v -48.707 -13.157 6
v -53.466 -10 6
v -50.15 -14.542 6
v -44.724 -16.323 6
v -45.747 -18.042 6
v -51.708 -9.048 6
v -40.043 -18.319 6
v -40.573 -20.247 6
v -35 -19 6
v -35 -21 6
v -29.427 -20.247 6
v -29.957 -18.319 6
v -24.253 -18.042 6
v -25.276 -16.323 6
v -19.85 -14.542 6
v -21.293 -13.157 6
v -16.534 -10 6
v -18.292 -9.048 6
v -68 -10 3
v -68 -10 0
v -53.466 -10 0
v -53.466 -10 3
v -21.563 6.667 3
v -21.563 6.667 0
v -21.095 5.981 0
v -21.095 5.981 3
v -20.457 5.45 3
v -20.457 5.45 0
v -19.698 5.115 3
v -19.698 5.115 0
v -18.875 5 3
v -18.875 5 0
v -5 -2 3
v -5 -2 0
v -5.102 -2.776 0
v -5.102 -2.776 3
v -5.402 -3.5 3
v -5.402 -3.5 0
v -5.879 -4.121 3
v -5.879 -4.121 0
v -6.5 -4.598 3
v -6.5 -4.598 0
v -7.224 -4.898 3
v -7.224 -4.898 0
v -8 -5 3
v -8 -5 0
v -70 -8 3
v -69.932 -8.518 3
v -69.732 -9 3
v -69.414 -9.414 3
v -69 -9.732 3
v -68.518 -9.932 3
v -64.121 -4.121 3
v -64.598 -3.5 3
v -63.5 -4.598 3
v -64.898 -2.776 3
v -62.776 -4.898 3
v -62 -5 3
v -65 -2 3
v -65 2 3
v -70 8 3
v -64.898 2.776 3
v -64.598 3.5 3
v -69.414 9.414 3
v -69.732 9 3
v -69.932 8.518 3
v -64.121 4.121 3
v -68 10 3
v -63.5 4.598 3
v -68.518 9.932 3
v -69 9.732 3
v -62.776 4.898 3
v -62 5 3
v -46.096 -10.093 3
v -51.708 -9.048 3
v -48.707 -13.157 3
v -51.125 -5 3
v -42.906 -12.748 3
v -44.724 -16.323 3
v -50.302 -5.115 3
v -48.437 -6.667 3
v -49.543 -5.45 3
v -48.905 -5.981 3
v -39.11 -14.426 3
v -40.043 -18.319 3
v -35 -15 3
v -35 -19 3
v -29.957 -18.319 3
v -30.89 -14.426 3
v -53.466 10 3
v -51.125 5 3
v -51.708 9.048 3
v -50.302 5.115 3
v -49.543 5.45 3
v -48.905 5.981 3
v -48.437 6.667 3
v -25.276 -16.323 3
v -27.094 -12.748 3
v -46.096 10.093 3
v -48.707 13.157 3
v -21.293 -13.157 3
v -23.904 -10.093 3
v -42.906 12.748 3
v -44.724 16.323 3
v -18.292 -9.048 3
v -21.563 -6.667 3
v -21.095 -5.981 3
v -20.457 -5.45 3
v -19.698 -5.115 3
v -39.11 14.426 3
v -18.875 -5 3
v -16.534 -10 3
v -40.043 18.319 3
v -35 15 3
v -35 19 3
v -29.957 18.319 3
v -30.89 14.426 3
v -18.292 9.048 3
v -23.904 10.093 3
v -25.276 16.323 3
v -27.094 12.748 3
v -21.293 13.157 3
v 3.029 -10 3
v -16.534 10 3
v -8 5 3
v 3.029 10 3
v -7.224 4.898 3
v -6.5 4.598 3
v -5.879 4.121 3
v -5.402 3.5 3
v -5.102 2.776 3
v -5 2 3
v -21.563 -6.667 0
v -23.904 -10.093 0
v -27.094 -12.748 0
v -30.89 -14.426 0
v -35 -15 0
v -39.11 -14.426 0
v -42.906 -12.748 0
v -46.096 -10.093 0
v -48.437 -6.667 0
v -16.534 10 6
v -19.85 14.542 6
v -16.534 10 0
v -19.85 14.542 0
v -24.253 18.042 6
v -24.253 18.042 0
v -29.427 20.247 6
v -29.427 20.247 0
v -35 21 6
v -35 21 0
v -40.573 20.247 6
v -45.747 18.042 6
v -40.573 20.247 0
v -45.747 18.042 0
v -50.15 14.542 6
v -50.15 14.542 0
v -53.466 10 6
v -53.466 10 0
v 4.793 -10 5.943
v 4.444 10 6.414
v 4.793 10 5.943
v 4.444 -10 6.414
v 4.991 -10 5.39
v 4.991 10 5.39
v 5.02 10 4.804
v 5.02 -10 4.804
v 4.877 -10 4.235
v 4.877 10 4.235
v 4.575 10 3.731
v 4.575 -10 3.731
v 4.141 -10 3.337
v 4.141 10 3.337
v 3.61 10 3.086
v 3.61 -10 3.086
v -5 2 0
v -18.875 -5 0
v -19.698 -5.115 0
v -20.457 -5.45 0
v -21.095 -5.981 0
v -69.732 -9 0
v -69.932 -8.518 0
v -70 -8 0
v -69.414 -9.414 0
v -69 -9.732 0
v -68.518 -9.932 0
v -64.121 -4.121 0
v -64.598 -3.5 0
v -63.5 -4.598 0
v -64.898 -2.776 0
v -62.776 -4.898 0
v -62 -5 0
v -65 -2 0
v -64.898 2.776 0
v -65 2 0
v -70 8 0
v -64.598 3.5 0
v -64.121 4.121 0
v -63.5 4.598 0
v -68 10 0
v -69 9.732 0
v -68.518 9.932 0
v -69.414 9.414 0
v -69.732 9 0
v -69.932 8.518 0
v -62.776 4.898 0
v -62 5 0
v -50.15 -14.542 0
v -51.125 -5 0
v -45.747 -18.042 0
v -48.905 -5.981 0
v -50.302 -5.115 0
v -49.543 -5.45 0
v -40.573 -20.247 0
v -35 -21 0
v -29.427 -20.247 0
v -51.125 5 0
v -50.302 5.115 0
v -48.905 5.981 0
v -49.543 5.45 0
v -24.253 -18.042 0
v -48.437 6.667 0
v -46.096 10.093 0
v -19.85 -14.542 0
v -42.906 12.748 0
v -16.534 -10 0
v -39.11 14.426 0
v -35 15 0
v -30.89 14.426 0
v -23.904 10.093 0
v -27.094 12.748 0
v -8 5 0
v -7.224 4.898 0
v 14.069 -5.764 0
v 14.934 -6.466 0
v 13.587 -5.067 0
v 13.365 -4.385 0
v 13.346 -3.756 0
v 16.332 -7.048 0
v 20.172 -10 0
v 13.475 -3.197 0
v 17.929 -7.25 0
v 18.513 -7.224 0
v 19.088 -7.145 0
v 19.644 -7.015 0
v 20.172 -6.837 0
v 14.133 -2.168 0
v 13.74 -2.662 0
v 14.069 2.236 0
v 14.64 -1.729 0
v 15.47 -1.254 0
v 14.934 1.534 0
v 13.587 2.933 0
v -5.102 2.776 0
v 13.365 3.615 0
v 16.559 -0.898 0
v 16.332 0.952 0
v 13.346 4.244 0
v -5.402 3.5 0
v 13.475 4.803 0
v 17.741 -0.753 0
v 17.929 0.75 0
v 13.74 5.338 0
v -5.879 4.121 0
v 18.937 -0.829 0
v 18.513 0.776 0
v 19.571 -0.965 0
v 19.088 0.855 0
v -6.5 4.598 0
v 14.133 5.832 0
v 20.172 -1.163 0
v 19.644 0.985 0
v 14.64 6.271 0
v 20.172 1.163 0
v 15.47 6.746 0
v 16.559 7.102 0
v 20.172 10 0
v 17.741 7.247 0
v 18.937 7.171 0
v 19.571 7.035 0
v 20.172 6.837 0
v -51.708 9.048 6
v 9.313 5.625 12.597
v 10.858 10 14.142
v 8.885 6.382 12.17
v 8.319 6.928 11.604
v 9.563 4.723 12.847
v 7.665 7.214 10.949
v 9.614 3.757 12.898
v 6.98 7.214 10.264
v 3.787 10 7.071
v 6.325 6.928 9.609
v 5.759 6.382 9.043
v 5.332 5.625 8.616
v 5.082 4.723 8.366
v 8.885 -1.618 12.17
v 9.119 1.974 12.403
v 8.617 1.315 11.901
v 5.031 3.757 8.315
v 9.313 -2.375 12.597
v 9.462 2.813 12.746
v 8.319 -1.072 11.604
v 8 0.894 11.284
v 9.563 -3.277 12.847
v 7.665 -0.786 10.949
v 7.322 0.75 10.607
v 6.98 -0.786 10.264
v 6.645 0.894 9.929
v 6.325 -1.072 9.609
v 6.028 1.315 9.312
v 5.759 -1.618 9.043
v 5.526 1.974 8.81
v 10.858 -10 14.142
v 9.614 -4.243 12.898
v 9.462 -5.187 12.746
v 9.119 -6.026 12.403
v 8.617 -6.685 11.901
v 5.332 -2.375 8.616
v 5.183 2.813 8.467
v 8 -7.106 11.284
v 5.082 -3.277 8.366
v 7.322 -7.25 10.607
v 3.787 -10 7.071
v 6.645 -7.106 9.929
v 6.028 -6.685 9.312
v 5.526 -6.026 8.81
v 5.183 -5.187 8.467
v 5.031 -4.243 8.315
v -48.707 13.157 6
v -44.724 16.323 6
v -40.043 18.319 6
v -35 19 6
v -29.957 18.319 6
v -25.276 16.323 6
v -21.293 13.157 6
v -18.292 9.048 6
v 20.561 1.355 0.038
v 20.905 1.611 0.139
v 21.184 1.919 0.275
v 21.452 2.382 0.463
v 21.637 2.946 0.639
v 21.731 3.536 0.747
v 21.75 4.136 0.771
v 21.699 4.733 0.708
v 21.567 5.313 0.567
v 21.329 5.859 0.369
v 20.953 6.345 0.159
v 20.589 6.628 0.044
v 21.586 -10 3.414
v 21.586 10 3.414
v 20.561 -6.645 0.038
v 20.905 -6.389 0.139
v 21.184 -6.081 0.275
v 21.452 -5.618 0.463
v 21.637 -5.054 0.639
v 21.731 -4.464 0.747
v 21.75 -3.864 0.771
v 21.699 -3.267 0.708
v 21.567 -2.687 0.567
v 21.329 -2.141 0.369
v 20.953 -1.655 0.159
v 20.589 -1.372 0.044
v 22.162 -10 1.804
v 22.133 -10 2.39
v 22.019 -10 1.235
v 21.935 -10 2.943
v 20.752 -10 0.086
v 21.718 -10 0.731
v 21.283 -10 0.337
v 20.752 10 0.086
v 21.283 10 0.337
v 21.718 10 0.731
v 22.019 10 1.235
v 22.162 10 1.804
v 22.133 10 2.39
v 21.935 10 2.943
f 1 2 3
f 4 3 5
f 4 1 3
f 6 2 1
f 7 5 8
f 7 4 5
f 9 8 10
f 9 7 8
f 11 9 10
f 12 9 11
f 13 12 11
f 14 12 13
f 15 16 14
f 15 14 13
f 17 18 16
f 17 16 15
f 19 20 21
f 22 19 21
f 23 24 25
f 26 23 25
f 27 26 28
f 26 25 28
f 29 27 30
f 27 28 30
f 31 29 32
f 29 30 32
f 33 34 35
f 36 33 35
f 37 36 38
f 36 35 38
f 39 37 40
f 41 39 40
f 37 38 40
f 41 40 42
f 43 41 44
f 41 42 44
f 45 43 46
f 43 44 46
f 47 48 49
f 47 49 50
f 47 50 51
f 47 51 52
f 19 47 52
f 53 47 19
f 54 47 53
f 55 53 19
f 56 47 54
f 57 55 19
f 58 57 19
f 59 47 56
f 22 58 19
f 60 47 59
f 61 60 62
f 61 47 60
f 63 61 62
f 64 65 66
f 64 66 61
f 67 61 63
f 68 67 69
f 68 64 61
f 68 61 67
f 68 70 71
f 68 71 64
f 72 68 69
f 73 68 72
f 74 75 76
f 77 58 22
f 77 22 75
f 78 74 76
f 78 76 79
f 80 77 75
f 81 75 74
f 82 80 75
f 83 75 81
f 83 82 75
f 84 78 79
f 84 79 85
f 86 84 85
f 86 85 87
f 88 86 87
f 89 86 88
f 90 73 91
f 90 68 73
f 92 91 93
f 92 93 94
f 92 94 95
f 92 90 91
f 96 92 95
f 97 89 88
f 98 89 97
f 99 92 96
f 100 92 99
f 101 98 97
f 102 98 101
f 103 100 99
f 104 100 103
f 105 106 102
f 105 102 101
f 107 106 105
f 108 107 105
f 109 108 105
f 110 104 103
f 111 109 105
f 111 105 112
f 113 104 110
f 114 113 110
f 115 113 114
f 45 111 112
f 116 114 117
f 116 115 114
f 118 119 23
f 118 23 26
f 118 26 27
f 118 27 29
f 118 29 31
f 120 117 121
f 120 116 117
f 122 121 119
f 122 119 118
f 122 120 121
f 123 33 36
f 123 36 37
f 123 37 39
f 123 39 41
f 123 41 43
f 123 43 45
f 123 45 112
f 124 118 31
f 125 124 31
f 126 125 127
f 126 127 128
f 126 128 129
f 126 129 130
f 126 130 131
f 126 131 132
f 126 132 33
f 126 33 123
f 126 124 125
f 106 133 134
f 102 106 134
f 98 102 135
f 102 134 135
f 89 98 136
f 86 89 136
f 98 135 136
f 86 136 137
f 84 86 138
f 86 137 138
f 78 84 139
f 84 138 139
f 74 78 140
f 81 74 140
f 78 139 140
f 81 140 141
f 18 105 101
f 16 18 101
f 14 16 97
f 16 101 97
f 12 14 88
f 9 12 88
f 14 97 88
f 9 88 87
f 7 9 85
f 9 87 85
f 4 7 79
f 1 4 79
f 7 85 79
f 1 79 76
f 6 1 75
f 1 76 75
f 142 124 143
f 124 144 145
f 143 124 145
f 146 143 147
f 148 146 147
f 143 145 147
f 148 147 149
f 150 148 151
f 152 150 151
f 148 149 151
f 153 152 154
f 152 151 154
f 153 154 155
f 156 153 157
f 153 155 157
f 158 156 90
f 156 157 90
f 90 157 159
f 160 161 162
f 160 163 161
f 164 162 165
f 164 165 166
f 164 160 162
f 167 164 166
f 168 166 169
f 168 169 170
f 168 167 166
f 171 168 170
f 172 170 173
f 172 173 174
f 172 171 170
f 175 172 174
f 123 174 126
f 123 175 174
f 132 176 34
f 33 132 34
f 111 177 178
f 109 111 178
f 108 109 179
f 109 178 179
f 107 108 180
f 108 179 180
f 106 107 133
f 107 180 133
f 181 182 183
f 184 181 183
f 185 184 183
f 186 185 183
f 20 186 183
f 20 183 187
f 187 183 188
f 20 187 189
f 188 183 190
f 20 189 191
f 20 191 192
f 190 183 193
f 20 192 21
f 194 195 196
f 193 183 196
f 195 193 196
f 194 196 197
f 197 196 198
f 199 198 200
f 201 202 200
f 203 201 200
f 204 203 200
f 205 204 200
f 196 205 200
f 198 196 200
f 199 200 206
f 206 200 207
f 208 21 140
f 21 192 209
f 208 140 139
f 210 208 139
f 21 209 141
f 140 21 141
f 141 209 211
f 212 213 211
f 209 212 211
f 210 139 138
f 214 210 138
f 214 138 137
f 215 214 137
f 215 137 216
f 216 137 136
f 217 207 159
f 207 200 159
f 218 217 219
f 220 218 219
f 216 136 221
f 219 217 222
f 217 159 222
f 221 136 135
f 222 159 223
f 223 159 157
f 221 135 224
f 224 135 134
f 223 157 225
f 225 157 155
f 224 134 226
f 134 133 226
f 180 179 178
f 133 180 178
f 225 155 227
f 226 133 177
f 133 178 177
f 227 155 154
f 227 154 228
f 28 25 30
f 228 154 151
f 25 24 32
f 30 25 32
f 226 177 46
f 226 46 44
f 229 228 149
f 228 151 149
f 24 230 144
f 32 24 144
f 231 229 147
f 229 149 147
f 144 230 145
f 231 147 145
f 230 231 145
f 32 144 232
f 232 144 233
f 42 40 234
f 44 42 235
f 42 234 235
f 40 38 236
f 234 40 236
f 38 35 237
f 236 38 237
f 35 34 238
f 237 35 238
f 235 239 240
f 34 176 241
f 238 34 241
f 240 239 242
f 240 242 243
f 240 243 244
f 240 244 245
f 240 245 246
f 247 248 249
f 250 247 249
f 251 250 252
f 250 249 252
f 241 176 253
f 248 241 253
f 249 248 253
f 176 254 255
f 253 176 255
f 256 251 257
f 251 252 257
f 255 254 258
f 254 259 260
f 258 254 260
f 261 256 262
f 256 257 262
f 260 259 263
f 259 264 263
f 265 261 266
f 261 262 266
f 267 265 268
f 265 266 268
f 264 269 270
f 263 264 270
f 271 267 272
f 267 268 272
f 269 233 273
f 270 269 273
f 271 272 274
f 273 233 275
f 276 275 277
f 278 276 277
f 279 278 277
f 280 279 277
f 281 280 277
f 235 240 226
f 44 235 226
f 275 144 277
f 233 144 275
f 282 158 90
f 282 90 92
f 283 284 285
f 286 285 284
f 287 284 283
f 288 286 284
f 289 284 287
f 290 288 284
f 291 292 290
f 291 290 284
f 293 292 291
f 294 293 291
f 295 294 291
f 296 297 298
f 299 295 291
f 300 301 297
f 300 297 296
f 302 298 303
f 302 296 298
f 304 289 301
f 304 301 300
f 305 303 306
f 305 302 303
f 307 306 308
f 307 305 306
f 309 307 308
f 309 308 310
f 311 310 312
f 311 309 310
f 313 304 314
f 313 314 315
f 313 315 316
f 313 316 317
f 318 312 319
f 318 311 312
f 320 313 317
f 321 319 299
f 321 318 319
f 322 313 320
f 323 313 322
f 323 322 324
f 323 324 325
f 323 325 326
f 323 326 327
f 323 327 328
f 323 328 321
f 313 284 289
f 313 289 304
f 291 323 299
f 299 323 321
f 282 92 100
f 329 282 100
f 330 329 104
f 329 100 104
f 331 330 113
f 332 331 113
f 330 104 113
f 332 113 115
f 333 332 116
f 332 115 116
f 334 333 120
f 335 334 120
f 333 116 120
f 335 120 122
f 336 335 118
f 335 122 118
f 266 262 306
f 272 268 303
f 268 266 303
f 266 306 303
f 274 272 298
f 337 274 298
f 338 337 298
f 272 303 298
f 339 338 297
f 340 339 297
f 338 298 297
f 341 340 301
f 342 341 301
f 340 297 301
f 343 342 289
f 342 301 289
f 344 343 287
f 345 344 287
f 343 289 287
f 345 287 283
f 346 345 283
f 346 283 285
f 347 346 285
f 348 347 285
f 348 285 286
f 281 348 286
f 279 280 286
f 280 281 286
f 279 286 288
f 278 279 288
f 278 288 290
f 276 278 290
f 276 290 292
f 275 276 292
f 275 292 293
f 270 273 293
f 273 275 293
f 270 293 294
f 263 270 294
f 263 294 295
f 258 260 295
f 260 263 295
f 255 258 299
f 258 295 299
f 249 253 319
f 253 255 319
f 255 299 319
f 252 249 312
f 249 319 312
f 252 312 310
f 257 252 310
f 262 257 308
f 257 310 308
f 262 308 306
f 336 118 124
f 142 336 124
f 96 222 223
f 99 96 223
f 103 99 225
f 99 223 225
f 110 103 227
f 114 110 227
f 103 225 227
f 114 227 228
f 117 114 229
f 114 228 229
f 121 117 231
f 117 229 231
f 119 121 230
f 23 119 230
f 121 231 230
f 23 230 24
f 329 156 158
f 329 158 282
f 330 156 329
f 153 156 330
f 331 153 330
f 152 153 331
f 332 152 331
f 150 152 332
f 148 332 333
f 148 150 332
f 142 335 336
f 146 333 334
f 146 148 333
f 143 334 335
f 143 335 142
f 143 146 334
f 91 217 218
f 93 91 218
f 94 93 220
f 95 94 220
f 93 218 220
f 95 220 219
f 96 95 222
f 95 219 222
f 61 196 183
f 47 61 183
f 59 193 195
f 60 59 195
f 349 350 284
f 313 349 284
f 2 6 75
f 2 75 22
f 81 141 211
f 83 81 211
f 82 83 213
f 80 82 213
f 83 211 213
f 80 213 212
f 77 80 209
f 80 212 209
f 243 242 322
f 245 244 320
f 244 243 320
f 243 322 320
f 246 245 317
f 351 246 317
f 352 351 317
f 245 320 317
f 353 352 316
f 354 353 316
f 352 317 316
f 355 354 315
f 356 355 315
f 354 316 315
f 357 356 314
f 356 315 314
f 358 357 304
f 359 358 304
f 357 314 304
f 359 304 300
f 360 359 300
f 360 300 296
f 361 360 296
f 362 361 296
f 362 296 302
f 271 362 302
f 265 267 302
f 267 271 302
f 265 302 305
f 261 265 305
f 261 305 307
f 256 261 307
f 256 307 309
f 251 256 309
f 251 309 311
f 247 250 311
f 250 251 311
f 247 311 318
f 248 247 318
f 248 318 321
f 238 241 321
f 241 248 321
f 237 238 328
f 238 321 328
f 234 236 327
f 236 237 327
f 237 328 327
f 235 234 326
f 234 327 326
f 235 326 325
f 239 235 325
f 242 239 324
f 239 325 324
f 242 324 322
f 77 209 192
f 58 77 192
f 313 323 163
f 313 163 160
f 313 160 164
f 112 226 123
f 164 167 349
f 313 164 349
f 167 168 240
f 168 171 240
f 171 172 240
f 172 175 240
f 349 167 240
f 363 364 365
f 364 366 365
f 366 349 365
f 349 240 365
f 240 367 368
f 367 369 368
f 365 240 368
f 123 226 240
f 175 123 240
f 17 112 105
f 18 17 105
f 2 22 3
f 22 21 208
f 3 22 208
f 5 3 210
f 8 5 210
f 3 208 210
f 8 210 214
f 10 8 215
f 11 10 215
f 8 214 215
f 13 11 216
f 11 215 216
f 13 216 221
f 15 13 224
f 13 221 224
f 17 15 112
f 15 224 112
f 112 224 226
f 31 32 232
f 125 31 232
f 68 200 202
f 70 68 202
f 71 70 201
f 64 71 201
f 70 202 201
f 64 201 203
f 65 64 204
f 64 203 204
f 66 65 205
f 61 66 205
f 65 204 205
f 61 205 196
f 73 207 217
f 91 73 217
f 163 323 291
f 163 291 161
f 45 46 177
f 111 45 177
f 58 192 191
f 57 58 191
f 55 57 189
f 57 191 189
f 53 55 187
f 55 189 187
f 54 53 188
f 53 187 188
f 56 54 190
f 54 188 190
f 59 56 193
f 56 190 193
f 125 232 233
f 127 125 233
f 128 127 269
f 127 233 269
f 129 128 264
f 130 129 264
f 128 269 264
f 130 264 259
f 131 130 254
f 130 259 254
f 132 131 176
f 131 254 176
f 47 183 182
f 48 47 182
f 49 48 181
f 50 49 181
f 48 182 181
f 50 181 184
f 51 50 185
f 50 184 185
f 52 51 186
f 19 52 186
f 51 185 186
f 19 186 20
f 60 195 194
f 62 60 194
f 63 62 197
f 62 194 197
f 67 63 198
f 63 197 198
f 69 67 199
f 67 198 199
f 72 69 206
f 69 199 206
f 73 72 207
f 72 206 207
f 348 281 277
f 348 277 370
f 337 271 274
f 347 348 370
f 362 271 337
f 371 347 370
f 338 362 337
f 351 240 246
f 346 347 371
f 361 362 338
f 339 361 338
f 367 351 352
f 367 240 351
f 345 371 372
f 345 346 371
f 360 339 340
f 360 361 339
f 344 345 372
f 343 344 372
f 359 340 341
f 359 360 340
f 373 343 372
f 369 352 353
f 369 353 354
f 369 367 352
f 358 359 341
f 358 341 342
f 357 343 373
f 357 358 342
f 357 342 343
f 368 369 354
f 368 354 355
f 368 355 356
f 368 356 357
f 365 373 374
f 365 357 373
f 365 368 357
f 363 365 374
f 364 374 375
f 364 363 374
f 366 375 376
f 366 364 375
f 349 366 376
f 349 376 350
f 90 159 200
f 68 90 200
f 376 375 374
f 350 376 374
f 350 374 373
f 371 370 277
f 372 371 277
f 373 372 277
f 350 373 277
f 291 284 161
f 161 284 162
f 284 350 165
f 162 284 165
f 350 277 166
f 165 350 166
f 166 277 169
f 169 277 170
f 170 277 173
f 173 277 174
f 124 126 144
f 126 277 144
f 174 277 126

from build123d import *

# Parameters (mm, degrees)
F1_DEPTH = 10
F2_R     = 3.25
F3_DEPTH = 25
F5_DEPTH = 3
F7_DEPTH = 3


with BuildPart() as f1:
    # F0 (on Front) → F1 (new body, symmetric)
    with BuildSketch(Plane.XZ):
        with BuildLine():
            Line((0, 3), (0, 0))
            Line((0, 0), (20.171573, 0))
            ThreePointArc((20.171573, 0), (22.019332, 1.234633), (21.585786, 3.414214))
            Line((21.585786, 3.414214), (10.857864, 14.142136))
            Line((10.857864, 14.142136), (3.786797, 7.071068))
            Line((3.786797, 7.071068), (4.443651, 6.414214))
            ThreePointArc((4.443651, 6.414214), (4.877196, 4.234633), (3.029437, 3))
            Line((3.029437, 3), (0, 3))
        make_face()
    extrude(amount=F1_DEPTH, both=True)

    # F2 (on face) → F3 (cut)
    with BuildSketch(Plane(origin=(-1.642136, 0, 1.642136), x_dir=(0, -1, 0), z_dir=(-0.707107, 0, 0.707107))):
        with Locations((-4, 12.67767)):
            Circle(F2_R)
        with Locations((4, 12.67767)):
            Circle(F2_R)
    extrude(amount=-F3_DEPTH, mode=Mode.SUBTRACT)

    # F4 (on Top) → F5 (join)
    with BuildSketch(Plane.XY):
        with BuildLine():
            Line((0, -10), (0, 10))
            Line((0, 10), (-16.533815, 10))
            ThreePointArc((-16.533815, 10), (-35, 21), (-53.466185, 10))
            Line((-53.466185, 10), (-68, 10))
            ThreePointArc((-68, 10), (-69.414214, 9.414214), (-70, 8))
            Line((-70, 8), (-70, -8))
            ThreePointArc((-70, -8), (-69.414214, -9.414214), (-68, -10))
            Line((-68, -10), (-53.466185, -10))
            ThreePointArc((-53.466185, -10), (-35, -21), (-16.533815, -10))
            Line((-16.533815, -10), (0, -10))
        make_face()
        with BuildLine():
            ThreePointArc((-21.562904, -6.666667), (-35, -15), (-48.437096, -6.666667))
            ThreePointArc((-48.437096, -6.666667), (-49.543377, -5.45049), (-51.124515, -5))
            Line((-51.124515, -5), (-62, -5))
            ThreePointArc((-62, -5), (-64.12132, -4.12132), (-65, -2))
            Line((-65, -2), (-65, 2))
            ThreePointArc((-65, 2), (-64.12132, 4.12132), (-62, 5))
            Line((-62, 5), (-51.124515, 5))
            ThreePointArc((-51.124515, 5), (-49.543377, 5.45049), (-48.437096, 6.666667))
            ThreePointArc((-48.437096, 6.666667), (-35, 15), (-21.562904, 6.666667))
            ThreePointArc((-21.562904, 6.666667), (-20.456623, 5.45049), (-18.875485, 5))
            Line((-18.875485, 5), (-8, 5))
            ThreePointArc((-8, 5), (-5.87868, 4.12132), (-5, 2))
            Line((-5, 2), (-5, -2))
            ThreePointArc((-5, -2), (-5.87868, -4.12132), (-8, -5))
            Line((-8, -5), (-18.875485, -5))
            ThreePointArc((-18.875485, -5), (-20.456623, -5.45049), (-21.562904, -6.666667))
        make_face(mode=Mode.SUBTRACT)
    extrude(amount=F5_DEPTH)

    # F6 (on face) → F7 (join)
    with BuildSketch(Plane.XY.offset(3)):
        with BuildLine():
            ThreePointArc((-51.707501, 9.047619), (-35, 19), (-18.292499, 9.047619))
            Line((-18.292499, 9.047619), (-16.533815, 10))
            ThreePointArc((-16.533815, 10), (-35, 21), (-53.466185, 10))
            Line((-53.466185, 10), (-51.707501, 9.047619))
        make_face()
        with BuildLine():
            Line((-16.533815, -10), (-18.292499, -9.047619))
            ThreePointArc((-18.292499, -9.047619), (-35, -19), (-51.707501, -9.047619))
            Line((-51.707501, -9.047619), (-53.466185, -10))
            ThreePointArc((-53.466185, -10), (-35, -21), (-16.533815, -10))
        make_face()
    extrude(amount=F7_DEPTH)


solid = f1.part
